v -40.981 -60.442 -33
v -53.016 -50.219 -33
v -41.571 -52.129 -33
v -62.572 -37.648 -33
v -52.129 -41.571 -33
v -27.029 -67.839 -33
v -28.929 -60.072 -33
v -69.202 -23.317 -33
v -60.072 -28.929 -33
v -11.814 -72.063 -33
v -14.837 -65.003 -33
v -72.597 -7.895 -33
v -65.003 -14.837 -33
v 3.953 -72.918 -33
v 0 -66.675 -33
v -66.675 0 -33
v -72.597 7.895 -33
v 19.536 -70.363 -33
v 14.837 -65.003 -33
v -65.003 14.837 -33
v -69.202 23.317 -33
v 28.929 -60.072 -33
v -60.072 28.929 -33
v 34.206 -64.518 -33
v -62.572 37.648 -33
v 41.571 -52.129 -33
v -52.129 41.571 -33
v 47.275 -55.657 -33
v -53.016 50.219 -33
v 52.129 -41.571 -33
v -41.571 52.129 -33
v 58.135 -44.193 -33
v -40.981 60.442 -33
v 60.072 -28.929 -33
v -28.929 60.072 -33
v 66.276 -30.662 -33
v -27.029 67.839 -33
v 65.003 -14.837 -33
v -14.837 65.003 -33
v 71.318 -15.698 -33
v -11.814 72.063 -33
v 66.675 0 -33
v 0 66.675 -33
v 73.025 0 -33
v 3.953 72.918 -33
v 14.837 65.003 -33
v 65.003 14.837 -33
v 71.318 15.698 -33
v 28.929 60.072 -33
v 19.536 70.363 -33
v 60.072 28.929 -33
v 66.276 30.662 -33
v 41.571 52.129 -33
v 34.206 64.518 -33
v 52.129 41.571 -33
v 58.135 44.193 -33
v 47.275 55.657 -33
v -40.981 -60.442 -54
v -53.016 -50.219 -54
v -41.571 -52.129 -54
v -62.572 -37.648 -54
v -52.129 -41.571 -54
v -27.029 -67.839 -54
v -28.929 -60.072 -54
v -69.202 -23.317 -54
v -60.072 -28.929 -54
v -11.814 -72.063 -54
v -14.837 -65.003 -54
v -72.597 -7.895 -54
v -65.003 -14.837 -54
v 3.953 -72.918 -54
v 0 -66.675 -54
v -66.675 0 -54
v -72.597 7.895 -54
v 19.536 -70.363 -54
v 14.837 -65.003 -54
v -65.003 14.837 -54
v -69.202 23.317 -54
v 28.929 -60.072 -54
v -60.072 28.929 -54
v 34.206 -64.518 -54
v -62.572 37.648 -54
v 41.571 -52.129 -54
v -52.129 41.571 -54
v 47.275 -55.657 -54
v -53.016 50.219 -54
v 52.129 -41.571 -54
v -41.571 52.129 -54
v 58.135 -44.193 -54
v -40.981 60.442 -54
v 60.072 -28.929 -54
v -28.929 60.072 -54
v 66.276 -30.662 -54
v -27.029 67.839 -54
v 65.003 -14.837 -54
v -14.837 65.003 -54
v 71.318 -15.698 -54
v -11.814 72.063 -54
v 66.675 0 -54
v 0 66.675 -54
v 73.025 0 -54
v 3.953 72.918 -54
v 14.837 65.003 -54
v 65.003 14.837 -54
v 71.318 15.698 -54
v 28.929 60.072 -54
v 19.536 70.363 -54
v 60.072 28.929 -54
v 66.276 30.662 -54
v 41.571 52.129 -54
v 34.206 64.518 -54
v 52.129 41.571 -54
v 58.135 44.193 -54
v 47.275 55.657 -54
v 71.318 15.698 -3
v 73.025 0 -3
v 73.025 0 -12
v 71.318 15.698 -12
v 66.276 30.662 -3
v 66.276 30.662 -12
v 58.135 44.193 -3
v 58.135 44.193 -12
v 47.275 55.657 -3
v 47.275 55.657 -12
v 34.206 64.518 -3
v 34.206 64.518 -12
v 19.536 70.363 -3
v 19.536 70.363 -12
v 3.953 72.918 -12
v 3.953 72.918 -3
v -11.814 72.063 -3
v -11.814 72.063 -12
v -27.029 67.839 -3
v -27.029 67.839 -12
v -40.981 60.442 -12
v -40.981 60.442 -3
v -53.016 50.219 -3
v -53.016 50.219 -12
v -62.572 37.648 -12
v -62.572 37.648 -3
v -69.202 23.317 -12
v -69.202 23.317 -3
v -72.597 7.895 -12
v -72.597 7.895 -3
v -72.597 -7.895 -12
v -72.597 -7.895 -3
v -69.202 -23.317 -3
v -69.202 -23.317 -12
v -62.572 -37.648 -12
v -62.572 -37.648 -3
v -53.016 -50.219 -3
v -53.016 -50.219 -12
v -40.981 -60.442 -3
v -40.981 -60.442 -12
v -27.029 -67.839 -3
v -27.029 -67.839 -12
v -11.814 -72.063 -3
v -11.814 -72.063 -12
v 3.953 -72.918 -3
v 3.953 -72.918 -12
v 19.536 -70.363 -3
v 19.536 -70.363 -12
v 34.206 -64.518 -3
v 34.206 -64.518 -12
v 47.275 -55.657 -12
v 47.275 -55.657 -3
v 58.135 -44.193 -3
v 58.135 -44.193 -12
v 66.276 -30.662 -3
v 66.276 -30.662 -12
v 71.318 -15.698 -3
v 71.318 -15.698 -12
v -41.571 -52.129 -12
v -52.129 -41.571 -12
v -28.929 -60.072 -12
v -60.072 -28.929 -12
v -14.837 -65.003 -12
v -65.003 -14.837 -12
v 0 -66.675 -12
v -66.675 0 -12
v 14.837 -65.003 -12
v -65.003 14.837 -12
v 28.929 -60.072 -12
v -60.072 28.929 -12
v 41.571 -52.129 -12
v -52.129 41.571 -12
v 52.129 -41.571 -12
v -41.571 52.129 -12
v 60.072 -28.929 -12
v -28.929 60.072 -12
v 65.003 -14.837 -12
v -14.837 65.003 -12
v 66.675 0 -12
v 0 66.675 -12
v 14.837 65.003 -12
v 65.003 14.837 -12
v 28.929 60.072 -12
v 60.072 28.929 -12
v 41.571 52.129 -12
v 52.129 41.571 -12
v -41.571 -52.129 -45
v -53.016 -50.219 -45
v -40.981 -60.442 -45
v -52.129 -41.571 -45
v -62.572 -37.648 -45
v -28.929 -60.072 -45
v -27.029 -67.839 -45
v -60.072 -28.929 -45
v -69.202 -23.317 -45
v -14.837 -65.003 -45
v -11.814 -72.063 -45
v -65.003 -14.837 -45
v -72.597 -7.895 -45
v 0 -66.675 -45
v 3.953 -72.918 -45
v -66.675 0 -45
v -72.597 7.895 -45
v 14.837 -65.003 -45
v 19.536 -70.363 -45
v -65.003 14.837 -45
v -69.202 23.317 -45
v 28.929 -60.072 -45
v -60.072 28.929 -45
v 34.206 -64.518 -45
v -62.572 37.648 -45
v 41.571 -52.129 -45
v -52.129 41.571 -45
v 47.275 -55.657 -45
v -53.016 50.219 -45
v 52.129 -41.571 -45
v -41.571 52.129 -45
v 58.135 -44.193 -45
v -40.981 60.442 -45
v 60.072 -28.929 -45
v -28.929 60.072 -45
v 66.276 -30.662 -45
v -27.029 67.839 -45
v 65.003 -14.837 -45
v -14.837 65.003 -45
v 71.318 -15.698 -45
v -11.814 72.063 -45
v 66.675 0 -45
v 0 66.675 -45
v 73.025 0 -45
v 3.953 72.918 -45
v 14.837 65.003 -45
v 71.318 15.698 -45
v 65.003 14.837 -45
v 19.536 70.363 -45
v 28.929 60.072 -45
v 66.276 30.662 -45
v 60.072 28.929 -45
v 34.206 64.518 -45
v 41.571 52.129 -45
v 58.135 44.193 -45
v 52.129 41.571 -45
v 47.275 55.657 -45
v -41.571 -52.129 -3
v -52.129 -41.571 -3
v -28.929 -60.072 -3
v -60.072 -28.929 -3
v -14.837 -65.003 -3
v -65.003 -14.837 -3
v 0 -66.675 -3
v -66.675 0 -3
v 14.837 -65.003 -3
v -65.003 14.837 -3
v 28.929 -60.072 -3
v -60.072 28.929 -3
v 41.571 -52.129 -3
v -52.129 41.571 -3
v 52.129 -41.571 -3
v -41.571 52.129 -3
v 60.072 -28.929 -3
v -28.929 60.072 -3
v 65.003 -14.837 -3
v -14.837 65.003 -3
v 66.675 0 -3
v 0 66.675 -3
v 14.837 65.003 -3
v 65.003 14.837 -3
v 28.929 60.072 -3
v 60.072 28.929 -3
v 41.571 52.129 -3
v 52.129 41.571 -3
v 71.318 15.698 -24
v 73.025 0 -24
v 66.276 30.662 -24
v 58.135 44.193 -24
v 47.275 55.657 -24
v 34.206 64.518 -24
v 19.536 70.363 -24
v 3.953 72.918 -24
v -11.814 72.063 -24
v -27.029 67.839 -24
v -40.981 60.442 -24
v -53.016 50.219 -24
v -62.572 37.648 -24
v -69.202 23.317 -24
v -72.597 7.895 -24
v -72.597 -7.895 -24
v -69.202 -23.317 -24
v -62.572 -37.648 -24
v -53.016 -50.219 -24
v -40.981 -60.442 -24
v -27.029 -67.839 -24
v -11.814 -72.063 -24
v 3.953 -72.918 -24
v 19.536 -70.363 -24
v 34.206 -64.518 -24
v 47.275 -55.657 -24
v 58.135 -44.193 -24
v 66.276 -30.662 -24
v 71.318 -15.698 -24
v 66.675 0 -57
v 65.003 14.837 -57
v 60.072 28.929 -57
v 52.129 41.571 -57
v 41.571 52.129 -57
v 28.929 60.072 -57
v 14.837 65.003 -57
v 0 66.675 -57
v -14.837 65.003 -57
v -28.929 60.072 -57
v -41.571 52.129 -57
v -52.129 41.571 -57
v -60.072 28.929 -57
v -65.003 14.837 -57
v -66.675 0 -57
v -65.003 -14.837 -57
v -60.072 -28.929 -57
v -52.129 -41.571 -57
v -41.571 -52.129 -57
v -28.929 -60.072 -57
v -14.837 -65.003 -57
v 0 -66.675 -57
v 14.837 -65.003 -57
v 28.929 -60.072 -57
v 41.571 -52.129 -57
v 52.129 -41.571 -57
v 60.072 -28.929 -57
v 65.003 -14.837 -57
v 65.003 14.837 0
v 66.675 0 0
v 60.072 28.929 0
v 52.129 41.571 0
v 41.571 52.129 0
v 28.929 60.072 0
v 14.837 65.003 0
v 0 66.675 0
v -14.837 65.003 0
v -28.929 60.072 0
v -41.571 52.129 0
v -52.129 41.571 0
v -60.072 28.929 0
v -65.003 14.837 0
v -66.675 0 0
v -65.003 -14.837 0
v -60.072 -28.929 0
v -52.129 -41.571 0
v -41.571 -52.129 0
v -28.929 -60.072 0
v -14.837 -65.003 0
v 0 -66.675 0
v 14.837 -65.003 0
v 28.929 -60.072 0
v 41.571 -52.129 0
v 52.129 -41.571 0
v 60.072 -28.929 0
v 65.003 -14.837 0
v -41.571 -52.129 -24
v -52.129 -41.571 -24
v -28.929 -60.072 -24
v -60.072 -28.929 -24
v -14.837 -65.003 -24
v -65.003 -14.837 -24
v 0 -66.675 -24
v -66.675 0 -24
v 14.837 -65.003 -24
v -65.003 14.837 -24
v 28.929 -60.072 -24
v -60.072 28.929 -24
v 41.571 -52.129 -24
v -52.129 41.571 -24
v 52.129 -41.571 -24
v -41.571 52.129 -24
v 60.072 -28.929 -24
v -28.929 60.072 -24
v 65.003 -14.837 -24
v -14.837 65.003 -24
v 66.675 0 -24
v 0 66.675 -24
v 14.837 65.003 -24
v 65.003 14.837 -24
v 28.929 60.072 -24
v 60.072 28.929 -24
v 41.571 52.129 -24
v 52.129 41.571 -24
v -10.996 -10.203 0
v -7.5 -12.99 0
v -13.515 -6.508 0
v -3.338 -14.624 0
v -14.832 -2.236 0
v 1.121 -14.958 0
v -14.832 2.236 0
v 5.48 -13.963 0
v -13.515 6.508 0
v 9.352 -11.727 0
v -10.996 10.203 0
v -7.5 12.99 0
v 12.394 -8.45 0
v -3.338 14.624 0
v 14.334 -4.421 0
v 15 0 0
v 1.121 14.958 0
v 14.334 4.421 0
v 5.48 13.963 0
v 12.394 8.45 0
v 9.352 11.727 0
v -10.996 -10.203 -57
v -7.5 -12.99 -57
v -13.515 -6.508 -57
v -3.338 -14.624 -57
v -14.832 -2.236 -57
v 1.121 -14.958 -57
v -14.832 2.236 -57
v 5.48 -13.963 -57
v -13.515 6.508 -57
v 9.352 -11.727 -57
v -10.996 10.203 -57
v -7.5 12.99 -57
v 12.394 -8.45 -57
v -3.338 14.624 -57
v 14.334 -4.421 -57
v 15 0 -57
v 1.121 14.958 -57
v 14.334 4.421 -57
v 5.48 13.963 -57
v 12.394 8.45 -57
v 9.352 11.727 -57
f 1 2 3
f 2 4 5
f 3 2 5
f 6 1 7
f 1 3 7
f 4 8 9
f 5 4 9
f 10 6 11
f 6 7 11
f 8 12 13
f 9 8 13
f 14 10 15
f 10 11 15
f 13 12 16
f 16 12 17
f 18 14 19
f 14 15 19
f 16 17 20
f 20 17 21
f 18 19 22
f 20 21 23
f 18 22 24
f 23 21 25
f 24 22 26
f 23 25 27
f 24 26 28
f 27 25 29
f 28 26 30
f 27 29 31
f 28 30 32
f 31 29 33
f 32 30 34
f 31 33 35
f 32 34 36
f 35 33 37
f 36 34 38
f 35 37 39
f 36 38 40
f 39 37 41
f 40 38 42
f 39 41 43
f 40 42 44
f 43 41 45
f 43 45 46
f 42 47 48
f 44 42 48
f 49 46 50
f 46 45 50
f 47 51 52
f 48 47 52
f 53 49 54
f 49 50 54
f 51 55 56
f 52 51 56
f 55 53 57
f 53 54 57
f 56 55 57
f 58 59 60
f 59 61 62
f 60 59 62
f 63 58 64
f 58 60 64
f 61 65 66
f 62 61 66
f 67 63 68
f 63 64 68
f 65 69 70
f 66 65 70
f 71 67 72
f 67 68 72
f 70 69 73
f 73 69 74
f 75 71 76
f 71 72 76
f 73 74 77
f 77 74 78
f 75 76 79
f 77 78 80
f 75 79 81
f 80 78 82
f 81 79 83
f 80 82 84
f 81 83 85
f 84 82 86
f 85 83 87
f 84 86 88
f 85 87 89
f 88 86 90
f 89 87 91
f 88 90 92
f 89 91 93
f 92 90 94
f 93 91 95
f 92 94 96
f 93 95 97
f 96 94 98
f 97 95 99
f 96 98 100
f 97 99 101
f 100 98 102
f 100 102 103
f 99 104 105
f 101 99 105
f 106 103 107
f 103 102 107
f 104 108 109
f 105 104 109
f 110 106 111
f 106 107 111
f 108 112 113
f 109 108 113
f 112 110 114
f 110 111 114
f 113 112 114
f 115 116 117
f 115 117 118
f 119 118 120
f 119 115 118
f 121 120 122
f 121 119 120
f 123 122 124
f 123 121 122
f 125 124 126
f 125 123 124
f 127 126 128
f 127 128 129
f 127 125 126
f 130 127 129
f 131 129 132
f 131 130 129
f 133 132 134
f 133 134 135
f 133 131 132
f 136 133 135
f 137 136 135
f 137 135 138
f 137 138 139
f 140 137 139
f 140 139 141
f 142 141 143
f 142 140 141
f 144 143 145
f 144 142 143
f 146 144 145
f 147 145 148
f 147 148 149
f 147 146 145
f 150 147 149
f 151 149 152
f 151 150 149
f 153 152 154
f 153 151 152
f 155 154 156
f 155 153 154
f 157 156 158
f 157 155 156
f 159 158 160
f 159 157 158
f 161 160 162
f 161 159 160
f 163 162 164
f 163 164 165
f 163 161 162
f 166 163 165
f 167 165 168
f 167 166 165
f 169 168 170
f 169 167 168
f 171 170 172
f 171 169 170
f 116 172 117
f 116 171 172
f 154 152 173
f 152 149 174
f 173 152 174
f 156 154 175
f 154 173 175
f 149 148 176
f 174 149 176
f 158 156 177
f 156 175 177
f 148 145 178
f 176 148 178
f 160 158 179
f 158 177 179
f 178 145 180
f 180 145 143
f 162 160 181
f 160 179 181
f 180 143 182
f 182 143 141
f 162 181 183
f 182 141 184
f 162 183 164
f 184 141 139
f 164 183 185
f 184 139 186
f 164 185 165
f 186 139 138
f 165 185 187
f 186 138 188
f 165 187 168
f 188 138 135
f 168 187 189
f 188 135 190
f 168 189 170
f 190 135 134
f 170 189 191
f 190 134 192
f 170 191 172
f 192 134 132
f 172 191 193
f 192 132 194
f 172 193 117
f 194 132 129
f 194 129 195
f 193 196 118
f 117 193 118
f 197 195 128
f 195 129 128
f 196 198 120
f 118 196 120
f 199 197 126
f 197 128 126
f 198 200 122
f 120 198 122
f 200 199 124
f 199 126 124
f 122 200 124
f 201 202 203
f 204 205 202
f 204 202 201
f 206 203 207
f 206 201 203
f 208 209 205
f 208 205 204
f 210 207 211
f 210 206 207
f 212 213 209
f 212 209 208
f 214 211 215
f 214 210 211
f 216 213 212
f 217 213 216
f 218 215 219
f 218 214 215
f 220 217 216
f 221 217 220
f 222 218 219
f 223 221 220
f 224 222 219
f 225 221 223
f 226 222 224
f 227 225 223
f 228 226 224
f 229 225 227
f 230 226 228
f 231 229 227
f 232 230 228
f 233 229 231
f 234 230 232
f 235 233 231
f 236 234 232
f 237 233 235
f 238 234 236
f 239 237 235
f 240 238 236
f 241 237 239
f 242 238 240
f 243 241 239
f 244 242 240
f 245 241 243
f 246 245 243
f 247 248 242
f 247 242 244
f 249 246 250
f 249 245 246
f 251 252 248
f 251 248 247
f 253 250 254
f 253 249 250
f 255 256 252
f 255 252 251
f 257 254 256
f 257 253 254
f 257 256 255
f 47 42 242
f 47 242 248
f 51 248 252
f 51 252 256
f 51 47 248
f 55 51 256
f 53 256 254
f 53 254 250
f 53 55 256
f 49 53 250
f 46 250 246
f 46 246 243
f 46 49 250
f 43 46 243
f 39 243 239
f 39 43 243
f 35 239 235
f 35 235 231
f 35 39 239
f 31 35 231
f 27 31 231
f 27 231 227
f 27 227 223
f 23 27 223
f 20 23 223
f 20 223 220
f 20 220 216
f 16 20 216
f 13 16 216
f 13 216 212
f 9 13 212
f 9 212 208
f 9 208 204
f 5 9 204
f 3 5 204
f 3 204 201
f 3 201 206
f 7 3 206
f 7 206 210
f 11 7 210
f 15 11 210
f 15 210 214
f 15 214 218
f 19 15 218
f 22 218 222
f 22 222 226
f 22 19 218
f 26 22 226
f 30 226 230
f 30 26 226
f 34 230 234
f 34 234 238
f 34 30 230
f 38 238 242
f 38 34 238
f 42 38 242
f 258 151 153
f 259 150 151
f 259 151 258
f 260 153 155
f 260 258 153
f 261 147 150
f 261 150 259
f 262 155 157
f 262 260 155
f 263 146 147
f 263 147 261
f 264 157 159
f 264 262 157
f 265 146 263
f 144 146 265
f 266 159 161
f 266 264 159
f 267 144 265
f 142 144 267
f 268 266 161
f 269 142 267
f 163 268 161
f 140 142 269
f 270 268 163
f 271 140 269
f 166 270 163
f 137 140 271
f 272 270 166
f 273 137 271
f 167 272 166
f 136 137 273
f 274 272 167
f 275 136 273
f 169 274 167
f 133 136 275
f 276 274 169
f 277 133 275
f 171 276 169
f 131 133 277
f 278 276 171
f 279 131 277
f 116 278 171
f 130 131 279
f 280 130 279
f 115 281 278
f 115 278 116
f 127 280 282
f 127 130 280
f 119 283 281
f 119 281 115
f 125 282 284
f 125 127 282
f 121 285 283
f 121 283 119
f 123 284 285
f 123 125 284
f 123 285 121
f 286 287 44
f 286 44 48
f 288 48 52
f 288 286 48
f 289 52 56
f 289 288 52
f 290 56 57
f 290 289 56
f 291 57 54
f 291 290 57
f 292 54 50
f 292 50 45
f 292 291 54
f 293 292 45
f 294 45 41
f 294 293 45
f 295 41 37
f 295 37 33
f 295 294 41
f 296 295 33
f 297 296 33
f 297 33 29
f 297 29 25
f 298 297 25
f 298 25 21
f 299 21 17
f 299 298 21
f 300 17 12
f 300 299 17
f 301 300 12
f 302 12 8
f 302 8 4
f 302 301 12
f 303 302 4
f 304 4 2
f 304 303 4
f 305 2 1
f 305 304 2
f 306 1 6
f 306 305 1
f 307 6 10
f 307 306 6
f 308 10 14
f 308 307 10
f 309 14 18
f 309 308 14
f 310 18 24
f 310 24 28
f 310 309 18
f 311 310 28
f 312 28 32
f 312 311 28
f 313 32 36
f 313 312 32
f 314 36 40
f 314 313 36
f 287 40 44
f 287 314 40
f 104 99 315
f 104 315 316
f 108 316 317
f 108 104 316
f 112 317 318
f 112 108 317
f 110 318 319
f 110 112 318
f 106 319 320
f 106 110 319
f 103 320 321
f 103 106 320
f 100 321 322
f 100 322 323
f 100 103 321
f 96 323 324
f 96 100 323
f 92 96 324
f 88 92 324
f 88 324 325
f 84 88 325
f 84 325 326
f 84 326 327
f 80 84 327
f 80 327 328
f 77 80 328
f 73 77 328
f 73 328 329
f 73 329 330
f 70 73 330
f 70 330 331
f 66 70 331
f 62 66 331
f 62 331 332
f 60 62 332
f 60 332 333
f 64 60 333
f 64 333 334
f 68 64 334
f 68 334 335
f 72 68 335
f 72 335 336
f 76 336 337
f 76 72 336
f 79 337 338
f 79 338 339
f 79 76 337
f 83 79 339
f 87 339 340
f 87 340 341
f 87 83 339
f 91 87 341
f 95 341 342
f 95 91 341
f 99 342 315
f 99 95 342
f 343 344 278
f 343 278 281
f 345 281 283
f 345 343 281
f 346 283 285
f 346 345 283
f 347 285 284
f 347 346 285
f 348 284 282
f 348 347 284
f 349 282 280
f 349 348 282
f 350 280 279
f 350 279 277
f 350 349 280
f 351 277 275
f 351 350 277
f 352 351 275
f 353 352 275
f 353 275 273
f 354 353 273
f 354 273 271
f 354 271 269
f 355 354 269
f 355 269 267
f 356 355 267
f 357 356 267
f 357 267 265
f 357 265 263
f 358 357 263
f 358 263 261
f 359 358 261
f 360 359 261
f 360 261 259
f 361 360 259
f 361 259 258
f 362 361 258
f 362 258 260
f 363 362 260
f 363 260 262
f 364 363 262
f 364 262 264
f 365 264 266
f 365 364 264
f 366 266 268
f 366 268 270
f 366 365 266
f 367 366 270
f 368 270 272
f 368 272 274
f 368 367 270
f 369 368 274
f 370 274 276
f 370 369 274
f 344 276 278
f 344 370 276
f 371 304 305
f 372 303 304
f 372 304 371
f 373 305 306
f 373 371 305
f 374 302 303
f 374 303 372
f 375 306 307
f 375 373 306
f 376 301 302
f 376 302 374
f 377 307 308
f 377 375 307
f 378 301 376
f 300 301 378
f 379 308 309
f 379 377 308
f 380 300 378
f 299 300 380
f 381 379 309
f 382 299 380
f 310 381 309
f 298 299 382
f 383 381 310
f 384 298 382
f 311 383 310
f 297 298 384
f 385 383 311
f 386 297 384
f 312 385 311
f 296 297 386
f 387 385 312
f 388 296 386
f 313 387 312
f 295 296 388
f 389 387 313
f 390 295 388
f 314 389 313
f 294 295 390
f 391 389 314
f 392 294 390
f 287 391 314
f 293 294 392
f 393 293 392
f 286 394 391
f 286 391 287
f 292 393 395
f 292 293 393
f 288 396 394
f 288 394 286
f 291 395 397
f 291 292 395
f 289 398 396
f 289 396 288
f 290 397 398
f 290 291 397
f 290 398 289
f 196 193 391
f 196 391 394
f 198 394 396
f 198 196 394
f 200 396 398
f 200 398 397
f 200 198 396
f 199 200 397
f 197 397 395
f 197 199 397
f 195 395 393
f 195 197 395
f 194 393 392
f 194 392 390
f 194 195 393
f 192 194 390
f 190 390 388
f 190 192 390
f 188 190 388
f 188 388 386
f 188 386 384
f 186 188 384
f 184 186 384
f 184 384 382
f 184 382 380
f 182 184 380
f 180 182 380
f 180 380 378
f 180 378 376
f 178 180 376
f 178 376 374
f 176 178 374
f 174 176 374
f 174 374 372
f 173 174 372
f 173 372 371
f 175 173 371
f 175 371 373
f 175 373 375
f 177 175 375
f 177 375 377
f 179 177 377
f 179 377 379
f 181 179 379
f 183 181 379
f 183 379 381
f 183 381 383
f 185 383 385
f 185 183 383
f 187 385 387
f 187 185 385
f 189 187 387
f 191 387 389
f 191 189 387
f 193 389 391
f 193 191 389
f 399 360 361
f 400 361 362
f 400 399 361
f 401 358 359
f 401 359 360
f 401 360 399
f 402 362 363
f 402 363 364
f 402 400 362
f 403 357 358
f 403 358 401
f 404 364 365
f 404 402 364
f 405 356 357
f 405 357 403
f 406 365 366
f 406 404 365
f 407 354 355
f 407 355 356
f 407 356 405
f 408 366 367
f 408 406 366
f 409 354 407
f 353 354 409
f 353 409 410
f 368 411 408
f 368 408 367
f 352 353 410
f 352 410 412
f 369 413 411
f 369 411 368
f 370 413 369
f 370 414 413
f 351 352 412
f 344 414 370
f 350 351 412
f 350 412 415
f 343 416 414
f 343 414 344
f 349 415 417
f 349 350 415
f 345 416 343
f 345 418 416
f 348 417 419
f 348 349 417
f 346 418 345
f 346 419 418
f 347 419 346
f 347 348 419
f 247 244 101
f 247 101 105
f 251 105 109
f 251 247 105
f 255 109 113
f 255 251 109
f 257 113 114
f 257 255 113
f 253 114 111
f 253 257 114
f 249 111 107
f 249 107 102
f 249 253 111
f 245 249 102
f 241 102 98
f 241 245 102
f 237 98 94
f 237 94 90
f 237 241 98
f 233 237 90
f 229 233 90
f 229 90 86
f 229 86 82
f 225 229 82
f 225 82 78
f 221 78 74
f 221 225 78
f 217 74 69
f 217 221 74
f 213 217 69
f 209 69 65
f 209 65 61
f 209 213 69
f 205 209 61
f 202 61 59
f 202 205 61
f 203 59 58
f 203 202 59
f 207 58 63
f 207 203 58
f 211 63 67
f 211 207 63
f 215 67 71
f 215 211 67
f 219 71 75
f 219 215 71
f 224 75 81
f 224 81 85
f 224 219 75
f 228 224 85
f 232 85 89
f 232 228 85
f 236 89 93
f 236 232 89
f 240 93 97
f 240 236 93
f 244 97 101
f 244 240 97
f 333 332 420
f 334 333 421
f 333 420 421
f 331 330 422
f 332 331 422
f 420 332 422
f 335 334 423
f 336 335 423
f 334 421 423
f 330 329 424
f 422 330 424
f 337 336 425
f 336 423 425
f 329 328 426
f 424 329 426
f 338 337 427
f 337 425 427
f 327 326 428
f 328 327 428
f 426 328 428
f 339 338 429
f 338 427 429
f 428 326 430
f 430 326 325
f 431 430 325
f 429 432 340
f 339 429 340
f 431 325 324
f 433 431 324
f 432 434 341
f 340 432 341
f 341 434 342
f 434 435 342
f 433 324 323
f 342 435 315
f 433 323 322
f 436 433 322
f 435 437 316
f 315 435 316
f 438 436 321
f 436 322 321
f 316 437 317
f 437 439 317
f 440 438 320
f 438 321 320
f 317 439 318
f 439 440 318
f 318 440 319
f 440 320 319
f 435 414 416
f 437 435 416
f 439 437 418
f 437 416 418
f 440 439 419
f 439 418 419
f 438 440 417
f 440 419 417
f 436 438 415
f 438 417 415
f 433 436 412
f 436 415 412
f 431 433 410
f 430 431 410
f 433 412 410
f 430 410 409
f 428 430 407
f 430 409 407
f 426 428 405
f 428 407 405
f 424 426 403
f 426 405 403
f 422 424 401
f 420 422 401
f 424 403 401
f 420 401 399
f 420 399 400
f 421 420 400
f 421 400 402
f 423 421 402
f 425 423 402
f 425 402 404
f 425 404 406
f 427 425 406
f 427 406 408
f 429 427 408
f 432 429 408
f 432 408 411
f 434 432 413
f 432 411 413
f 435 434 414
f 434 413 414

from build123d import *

# Parameters (mm, degrees)
SKETCH1_R           = 66.675
SKETCH1_R_2         = 15
BOSS_EXTRUDE1_DEPTH = 57
SKETCH2_R           = 73.025
SKETCH2_R_2         = 66.675
BOSS_EXTRUDE2_DEPTH = 9
LPATTERN1_COUNT     = 3
LPATTERN1_PITCH     = 21


with BuildPart() as part:
    # Sketch1 → Boss-Extrude1 (new body)
    with BuildSketch(Plane.XY):
        Circle(SKETCH1_R)
        Circle(SKETCH1_R_2, mode=Mode.SUBTRACT)
    extrude(amount=-BOSS_EXTRUDE1_DEPTH)

    # Sketch2 → Boss-Extrude2 (add)
    with BuildSketch(Plane.XY.offset(-3)):
        Circle(SKETCH2_R)
        Circle(SKETCH2_R_2, mode=Mode.SUBTRACT)
    boss_extrude2 = extrude(amount=-BOSS_EXTRUDE2_DEPTH)

    # LPattern1: Boss-Extrude2 ×3
    with Locations(*[(0, 0, -i * LPATTERN1_PITCH) for i in range(1, LPATTERN1_COUNT)]):
        add(boss_extrude2)


solid = part.part
